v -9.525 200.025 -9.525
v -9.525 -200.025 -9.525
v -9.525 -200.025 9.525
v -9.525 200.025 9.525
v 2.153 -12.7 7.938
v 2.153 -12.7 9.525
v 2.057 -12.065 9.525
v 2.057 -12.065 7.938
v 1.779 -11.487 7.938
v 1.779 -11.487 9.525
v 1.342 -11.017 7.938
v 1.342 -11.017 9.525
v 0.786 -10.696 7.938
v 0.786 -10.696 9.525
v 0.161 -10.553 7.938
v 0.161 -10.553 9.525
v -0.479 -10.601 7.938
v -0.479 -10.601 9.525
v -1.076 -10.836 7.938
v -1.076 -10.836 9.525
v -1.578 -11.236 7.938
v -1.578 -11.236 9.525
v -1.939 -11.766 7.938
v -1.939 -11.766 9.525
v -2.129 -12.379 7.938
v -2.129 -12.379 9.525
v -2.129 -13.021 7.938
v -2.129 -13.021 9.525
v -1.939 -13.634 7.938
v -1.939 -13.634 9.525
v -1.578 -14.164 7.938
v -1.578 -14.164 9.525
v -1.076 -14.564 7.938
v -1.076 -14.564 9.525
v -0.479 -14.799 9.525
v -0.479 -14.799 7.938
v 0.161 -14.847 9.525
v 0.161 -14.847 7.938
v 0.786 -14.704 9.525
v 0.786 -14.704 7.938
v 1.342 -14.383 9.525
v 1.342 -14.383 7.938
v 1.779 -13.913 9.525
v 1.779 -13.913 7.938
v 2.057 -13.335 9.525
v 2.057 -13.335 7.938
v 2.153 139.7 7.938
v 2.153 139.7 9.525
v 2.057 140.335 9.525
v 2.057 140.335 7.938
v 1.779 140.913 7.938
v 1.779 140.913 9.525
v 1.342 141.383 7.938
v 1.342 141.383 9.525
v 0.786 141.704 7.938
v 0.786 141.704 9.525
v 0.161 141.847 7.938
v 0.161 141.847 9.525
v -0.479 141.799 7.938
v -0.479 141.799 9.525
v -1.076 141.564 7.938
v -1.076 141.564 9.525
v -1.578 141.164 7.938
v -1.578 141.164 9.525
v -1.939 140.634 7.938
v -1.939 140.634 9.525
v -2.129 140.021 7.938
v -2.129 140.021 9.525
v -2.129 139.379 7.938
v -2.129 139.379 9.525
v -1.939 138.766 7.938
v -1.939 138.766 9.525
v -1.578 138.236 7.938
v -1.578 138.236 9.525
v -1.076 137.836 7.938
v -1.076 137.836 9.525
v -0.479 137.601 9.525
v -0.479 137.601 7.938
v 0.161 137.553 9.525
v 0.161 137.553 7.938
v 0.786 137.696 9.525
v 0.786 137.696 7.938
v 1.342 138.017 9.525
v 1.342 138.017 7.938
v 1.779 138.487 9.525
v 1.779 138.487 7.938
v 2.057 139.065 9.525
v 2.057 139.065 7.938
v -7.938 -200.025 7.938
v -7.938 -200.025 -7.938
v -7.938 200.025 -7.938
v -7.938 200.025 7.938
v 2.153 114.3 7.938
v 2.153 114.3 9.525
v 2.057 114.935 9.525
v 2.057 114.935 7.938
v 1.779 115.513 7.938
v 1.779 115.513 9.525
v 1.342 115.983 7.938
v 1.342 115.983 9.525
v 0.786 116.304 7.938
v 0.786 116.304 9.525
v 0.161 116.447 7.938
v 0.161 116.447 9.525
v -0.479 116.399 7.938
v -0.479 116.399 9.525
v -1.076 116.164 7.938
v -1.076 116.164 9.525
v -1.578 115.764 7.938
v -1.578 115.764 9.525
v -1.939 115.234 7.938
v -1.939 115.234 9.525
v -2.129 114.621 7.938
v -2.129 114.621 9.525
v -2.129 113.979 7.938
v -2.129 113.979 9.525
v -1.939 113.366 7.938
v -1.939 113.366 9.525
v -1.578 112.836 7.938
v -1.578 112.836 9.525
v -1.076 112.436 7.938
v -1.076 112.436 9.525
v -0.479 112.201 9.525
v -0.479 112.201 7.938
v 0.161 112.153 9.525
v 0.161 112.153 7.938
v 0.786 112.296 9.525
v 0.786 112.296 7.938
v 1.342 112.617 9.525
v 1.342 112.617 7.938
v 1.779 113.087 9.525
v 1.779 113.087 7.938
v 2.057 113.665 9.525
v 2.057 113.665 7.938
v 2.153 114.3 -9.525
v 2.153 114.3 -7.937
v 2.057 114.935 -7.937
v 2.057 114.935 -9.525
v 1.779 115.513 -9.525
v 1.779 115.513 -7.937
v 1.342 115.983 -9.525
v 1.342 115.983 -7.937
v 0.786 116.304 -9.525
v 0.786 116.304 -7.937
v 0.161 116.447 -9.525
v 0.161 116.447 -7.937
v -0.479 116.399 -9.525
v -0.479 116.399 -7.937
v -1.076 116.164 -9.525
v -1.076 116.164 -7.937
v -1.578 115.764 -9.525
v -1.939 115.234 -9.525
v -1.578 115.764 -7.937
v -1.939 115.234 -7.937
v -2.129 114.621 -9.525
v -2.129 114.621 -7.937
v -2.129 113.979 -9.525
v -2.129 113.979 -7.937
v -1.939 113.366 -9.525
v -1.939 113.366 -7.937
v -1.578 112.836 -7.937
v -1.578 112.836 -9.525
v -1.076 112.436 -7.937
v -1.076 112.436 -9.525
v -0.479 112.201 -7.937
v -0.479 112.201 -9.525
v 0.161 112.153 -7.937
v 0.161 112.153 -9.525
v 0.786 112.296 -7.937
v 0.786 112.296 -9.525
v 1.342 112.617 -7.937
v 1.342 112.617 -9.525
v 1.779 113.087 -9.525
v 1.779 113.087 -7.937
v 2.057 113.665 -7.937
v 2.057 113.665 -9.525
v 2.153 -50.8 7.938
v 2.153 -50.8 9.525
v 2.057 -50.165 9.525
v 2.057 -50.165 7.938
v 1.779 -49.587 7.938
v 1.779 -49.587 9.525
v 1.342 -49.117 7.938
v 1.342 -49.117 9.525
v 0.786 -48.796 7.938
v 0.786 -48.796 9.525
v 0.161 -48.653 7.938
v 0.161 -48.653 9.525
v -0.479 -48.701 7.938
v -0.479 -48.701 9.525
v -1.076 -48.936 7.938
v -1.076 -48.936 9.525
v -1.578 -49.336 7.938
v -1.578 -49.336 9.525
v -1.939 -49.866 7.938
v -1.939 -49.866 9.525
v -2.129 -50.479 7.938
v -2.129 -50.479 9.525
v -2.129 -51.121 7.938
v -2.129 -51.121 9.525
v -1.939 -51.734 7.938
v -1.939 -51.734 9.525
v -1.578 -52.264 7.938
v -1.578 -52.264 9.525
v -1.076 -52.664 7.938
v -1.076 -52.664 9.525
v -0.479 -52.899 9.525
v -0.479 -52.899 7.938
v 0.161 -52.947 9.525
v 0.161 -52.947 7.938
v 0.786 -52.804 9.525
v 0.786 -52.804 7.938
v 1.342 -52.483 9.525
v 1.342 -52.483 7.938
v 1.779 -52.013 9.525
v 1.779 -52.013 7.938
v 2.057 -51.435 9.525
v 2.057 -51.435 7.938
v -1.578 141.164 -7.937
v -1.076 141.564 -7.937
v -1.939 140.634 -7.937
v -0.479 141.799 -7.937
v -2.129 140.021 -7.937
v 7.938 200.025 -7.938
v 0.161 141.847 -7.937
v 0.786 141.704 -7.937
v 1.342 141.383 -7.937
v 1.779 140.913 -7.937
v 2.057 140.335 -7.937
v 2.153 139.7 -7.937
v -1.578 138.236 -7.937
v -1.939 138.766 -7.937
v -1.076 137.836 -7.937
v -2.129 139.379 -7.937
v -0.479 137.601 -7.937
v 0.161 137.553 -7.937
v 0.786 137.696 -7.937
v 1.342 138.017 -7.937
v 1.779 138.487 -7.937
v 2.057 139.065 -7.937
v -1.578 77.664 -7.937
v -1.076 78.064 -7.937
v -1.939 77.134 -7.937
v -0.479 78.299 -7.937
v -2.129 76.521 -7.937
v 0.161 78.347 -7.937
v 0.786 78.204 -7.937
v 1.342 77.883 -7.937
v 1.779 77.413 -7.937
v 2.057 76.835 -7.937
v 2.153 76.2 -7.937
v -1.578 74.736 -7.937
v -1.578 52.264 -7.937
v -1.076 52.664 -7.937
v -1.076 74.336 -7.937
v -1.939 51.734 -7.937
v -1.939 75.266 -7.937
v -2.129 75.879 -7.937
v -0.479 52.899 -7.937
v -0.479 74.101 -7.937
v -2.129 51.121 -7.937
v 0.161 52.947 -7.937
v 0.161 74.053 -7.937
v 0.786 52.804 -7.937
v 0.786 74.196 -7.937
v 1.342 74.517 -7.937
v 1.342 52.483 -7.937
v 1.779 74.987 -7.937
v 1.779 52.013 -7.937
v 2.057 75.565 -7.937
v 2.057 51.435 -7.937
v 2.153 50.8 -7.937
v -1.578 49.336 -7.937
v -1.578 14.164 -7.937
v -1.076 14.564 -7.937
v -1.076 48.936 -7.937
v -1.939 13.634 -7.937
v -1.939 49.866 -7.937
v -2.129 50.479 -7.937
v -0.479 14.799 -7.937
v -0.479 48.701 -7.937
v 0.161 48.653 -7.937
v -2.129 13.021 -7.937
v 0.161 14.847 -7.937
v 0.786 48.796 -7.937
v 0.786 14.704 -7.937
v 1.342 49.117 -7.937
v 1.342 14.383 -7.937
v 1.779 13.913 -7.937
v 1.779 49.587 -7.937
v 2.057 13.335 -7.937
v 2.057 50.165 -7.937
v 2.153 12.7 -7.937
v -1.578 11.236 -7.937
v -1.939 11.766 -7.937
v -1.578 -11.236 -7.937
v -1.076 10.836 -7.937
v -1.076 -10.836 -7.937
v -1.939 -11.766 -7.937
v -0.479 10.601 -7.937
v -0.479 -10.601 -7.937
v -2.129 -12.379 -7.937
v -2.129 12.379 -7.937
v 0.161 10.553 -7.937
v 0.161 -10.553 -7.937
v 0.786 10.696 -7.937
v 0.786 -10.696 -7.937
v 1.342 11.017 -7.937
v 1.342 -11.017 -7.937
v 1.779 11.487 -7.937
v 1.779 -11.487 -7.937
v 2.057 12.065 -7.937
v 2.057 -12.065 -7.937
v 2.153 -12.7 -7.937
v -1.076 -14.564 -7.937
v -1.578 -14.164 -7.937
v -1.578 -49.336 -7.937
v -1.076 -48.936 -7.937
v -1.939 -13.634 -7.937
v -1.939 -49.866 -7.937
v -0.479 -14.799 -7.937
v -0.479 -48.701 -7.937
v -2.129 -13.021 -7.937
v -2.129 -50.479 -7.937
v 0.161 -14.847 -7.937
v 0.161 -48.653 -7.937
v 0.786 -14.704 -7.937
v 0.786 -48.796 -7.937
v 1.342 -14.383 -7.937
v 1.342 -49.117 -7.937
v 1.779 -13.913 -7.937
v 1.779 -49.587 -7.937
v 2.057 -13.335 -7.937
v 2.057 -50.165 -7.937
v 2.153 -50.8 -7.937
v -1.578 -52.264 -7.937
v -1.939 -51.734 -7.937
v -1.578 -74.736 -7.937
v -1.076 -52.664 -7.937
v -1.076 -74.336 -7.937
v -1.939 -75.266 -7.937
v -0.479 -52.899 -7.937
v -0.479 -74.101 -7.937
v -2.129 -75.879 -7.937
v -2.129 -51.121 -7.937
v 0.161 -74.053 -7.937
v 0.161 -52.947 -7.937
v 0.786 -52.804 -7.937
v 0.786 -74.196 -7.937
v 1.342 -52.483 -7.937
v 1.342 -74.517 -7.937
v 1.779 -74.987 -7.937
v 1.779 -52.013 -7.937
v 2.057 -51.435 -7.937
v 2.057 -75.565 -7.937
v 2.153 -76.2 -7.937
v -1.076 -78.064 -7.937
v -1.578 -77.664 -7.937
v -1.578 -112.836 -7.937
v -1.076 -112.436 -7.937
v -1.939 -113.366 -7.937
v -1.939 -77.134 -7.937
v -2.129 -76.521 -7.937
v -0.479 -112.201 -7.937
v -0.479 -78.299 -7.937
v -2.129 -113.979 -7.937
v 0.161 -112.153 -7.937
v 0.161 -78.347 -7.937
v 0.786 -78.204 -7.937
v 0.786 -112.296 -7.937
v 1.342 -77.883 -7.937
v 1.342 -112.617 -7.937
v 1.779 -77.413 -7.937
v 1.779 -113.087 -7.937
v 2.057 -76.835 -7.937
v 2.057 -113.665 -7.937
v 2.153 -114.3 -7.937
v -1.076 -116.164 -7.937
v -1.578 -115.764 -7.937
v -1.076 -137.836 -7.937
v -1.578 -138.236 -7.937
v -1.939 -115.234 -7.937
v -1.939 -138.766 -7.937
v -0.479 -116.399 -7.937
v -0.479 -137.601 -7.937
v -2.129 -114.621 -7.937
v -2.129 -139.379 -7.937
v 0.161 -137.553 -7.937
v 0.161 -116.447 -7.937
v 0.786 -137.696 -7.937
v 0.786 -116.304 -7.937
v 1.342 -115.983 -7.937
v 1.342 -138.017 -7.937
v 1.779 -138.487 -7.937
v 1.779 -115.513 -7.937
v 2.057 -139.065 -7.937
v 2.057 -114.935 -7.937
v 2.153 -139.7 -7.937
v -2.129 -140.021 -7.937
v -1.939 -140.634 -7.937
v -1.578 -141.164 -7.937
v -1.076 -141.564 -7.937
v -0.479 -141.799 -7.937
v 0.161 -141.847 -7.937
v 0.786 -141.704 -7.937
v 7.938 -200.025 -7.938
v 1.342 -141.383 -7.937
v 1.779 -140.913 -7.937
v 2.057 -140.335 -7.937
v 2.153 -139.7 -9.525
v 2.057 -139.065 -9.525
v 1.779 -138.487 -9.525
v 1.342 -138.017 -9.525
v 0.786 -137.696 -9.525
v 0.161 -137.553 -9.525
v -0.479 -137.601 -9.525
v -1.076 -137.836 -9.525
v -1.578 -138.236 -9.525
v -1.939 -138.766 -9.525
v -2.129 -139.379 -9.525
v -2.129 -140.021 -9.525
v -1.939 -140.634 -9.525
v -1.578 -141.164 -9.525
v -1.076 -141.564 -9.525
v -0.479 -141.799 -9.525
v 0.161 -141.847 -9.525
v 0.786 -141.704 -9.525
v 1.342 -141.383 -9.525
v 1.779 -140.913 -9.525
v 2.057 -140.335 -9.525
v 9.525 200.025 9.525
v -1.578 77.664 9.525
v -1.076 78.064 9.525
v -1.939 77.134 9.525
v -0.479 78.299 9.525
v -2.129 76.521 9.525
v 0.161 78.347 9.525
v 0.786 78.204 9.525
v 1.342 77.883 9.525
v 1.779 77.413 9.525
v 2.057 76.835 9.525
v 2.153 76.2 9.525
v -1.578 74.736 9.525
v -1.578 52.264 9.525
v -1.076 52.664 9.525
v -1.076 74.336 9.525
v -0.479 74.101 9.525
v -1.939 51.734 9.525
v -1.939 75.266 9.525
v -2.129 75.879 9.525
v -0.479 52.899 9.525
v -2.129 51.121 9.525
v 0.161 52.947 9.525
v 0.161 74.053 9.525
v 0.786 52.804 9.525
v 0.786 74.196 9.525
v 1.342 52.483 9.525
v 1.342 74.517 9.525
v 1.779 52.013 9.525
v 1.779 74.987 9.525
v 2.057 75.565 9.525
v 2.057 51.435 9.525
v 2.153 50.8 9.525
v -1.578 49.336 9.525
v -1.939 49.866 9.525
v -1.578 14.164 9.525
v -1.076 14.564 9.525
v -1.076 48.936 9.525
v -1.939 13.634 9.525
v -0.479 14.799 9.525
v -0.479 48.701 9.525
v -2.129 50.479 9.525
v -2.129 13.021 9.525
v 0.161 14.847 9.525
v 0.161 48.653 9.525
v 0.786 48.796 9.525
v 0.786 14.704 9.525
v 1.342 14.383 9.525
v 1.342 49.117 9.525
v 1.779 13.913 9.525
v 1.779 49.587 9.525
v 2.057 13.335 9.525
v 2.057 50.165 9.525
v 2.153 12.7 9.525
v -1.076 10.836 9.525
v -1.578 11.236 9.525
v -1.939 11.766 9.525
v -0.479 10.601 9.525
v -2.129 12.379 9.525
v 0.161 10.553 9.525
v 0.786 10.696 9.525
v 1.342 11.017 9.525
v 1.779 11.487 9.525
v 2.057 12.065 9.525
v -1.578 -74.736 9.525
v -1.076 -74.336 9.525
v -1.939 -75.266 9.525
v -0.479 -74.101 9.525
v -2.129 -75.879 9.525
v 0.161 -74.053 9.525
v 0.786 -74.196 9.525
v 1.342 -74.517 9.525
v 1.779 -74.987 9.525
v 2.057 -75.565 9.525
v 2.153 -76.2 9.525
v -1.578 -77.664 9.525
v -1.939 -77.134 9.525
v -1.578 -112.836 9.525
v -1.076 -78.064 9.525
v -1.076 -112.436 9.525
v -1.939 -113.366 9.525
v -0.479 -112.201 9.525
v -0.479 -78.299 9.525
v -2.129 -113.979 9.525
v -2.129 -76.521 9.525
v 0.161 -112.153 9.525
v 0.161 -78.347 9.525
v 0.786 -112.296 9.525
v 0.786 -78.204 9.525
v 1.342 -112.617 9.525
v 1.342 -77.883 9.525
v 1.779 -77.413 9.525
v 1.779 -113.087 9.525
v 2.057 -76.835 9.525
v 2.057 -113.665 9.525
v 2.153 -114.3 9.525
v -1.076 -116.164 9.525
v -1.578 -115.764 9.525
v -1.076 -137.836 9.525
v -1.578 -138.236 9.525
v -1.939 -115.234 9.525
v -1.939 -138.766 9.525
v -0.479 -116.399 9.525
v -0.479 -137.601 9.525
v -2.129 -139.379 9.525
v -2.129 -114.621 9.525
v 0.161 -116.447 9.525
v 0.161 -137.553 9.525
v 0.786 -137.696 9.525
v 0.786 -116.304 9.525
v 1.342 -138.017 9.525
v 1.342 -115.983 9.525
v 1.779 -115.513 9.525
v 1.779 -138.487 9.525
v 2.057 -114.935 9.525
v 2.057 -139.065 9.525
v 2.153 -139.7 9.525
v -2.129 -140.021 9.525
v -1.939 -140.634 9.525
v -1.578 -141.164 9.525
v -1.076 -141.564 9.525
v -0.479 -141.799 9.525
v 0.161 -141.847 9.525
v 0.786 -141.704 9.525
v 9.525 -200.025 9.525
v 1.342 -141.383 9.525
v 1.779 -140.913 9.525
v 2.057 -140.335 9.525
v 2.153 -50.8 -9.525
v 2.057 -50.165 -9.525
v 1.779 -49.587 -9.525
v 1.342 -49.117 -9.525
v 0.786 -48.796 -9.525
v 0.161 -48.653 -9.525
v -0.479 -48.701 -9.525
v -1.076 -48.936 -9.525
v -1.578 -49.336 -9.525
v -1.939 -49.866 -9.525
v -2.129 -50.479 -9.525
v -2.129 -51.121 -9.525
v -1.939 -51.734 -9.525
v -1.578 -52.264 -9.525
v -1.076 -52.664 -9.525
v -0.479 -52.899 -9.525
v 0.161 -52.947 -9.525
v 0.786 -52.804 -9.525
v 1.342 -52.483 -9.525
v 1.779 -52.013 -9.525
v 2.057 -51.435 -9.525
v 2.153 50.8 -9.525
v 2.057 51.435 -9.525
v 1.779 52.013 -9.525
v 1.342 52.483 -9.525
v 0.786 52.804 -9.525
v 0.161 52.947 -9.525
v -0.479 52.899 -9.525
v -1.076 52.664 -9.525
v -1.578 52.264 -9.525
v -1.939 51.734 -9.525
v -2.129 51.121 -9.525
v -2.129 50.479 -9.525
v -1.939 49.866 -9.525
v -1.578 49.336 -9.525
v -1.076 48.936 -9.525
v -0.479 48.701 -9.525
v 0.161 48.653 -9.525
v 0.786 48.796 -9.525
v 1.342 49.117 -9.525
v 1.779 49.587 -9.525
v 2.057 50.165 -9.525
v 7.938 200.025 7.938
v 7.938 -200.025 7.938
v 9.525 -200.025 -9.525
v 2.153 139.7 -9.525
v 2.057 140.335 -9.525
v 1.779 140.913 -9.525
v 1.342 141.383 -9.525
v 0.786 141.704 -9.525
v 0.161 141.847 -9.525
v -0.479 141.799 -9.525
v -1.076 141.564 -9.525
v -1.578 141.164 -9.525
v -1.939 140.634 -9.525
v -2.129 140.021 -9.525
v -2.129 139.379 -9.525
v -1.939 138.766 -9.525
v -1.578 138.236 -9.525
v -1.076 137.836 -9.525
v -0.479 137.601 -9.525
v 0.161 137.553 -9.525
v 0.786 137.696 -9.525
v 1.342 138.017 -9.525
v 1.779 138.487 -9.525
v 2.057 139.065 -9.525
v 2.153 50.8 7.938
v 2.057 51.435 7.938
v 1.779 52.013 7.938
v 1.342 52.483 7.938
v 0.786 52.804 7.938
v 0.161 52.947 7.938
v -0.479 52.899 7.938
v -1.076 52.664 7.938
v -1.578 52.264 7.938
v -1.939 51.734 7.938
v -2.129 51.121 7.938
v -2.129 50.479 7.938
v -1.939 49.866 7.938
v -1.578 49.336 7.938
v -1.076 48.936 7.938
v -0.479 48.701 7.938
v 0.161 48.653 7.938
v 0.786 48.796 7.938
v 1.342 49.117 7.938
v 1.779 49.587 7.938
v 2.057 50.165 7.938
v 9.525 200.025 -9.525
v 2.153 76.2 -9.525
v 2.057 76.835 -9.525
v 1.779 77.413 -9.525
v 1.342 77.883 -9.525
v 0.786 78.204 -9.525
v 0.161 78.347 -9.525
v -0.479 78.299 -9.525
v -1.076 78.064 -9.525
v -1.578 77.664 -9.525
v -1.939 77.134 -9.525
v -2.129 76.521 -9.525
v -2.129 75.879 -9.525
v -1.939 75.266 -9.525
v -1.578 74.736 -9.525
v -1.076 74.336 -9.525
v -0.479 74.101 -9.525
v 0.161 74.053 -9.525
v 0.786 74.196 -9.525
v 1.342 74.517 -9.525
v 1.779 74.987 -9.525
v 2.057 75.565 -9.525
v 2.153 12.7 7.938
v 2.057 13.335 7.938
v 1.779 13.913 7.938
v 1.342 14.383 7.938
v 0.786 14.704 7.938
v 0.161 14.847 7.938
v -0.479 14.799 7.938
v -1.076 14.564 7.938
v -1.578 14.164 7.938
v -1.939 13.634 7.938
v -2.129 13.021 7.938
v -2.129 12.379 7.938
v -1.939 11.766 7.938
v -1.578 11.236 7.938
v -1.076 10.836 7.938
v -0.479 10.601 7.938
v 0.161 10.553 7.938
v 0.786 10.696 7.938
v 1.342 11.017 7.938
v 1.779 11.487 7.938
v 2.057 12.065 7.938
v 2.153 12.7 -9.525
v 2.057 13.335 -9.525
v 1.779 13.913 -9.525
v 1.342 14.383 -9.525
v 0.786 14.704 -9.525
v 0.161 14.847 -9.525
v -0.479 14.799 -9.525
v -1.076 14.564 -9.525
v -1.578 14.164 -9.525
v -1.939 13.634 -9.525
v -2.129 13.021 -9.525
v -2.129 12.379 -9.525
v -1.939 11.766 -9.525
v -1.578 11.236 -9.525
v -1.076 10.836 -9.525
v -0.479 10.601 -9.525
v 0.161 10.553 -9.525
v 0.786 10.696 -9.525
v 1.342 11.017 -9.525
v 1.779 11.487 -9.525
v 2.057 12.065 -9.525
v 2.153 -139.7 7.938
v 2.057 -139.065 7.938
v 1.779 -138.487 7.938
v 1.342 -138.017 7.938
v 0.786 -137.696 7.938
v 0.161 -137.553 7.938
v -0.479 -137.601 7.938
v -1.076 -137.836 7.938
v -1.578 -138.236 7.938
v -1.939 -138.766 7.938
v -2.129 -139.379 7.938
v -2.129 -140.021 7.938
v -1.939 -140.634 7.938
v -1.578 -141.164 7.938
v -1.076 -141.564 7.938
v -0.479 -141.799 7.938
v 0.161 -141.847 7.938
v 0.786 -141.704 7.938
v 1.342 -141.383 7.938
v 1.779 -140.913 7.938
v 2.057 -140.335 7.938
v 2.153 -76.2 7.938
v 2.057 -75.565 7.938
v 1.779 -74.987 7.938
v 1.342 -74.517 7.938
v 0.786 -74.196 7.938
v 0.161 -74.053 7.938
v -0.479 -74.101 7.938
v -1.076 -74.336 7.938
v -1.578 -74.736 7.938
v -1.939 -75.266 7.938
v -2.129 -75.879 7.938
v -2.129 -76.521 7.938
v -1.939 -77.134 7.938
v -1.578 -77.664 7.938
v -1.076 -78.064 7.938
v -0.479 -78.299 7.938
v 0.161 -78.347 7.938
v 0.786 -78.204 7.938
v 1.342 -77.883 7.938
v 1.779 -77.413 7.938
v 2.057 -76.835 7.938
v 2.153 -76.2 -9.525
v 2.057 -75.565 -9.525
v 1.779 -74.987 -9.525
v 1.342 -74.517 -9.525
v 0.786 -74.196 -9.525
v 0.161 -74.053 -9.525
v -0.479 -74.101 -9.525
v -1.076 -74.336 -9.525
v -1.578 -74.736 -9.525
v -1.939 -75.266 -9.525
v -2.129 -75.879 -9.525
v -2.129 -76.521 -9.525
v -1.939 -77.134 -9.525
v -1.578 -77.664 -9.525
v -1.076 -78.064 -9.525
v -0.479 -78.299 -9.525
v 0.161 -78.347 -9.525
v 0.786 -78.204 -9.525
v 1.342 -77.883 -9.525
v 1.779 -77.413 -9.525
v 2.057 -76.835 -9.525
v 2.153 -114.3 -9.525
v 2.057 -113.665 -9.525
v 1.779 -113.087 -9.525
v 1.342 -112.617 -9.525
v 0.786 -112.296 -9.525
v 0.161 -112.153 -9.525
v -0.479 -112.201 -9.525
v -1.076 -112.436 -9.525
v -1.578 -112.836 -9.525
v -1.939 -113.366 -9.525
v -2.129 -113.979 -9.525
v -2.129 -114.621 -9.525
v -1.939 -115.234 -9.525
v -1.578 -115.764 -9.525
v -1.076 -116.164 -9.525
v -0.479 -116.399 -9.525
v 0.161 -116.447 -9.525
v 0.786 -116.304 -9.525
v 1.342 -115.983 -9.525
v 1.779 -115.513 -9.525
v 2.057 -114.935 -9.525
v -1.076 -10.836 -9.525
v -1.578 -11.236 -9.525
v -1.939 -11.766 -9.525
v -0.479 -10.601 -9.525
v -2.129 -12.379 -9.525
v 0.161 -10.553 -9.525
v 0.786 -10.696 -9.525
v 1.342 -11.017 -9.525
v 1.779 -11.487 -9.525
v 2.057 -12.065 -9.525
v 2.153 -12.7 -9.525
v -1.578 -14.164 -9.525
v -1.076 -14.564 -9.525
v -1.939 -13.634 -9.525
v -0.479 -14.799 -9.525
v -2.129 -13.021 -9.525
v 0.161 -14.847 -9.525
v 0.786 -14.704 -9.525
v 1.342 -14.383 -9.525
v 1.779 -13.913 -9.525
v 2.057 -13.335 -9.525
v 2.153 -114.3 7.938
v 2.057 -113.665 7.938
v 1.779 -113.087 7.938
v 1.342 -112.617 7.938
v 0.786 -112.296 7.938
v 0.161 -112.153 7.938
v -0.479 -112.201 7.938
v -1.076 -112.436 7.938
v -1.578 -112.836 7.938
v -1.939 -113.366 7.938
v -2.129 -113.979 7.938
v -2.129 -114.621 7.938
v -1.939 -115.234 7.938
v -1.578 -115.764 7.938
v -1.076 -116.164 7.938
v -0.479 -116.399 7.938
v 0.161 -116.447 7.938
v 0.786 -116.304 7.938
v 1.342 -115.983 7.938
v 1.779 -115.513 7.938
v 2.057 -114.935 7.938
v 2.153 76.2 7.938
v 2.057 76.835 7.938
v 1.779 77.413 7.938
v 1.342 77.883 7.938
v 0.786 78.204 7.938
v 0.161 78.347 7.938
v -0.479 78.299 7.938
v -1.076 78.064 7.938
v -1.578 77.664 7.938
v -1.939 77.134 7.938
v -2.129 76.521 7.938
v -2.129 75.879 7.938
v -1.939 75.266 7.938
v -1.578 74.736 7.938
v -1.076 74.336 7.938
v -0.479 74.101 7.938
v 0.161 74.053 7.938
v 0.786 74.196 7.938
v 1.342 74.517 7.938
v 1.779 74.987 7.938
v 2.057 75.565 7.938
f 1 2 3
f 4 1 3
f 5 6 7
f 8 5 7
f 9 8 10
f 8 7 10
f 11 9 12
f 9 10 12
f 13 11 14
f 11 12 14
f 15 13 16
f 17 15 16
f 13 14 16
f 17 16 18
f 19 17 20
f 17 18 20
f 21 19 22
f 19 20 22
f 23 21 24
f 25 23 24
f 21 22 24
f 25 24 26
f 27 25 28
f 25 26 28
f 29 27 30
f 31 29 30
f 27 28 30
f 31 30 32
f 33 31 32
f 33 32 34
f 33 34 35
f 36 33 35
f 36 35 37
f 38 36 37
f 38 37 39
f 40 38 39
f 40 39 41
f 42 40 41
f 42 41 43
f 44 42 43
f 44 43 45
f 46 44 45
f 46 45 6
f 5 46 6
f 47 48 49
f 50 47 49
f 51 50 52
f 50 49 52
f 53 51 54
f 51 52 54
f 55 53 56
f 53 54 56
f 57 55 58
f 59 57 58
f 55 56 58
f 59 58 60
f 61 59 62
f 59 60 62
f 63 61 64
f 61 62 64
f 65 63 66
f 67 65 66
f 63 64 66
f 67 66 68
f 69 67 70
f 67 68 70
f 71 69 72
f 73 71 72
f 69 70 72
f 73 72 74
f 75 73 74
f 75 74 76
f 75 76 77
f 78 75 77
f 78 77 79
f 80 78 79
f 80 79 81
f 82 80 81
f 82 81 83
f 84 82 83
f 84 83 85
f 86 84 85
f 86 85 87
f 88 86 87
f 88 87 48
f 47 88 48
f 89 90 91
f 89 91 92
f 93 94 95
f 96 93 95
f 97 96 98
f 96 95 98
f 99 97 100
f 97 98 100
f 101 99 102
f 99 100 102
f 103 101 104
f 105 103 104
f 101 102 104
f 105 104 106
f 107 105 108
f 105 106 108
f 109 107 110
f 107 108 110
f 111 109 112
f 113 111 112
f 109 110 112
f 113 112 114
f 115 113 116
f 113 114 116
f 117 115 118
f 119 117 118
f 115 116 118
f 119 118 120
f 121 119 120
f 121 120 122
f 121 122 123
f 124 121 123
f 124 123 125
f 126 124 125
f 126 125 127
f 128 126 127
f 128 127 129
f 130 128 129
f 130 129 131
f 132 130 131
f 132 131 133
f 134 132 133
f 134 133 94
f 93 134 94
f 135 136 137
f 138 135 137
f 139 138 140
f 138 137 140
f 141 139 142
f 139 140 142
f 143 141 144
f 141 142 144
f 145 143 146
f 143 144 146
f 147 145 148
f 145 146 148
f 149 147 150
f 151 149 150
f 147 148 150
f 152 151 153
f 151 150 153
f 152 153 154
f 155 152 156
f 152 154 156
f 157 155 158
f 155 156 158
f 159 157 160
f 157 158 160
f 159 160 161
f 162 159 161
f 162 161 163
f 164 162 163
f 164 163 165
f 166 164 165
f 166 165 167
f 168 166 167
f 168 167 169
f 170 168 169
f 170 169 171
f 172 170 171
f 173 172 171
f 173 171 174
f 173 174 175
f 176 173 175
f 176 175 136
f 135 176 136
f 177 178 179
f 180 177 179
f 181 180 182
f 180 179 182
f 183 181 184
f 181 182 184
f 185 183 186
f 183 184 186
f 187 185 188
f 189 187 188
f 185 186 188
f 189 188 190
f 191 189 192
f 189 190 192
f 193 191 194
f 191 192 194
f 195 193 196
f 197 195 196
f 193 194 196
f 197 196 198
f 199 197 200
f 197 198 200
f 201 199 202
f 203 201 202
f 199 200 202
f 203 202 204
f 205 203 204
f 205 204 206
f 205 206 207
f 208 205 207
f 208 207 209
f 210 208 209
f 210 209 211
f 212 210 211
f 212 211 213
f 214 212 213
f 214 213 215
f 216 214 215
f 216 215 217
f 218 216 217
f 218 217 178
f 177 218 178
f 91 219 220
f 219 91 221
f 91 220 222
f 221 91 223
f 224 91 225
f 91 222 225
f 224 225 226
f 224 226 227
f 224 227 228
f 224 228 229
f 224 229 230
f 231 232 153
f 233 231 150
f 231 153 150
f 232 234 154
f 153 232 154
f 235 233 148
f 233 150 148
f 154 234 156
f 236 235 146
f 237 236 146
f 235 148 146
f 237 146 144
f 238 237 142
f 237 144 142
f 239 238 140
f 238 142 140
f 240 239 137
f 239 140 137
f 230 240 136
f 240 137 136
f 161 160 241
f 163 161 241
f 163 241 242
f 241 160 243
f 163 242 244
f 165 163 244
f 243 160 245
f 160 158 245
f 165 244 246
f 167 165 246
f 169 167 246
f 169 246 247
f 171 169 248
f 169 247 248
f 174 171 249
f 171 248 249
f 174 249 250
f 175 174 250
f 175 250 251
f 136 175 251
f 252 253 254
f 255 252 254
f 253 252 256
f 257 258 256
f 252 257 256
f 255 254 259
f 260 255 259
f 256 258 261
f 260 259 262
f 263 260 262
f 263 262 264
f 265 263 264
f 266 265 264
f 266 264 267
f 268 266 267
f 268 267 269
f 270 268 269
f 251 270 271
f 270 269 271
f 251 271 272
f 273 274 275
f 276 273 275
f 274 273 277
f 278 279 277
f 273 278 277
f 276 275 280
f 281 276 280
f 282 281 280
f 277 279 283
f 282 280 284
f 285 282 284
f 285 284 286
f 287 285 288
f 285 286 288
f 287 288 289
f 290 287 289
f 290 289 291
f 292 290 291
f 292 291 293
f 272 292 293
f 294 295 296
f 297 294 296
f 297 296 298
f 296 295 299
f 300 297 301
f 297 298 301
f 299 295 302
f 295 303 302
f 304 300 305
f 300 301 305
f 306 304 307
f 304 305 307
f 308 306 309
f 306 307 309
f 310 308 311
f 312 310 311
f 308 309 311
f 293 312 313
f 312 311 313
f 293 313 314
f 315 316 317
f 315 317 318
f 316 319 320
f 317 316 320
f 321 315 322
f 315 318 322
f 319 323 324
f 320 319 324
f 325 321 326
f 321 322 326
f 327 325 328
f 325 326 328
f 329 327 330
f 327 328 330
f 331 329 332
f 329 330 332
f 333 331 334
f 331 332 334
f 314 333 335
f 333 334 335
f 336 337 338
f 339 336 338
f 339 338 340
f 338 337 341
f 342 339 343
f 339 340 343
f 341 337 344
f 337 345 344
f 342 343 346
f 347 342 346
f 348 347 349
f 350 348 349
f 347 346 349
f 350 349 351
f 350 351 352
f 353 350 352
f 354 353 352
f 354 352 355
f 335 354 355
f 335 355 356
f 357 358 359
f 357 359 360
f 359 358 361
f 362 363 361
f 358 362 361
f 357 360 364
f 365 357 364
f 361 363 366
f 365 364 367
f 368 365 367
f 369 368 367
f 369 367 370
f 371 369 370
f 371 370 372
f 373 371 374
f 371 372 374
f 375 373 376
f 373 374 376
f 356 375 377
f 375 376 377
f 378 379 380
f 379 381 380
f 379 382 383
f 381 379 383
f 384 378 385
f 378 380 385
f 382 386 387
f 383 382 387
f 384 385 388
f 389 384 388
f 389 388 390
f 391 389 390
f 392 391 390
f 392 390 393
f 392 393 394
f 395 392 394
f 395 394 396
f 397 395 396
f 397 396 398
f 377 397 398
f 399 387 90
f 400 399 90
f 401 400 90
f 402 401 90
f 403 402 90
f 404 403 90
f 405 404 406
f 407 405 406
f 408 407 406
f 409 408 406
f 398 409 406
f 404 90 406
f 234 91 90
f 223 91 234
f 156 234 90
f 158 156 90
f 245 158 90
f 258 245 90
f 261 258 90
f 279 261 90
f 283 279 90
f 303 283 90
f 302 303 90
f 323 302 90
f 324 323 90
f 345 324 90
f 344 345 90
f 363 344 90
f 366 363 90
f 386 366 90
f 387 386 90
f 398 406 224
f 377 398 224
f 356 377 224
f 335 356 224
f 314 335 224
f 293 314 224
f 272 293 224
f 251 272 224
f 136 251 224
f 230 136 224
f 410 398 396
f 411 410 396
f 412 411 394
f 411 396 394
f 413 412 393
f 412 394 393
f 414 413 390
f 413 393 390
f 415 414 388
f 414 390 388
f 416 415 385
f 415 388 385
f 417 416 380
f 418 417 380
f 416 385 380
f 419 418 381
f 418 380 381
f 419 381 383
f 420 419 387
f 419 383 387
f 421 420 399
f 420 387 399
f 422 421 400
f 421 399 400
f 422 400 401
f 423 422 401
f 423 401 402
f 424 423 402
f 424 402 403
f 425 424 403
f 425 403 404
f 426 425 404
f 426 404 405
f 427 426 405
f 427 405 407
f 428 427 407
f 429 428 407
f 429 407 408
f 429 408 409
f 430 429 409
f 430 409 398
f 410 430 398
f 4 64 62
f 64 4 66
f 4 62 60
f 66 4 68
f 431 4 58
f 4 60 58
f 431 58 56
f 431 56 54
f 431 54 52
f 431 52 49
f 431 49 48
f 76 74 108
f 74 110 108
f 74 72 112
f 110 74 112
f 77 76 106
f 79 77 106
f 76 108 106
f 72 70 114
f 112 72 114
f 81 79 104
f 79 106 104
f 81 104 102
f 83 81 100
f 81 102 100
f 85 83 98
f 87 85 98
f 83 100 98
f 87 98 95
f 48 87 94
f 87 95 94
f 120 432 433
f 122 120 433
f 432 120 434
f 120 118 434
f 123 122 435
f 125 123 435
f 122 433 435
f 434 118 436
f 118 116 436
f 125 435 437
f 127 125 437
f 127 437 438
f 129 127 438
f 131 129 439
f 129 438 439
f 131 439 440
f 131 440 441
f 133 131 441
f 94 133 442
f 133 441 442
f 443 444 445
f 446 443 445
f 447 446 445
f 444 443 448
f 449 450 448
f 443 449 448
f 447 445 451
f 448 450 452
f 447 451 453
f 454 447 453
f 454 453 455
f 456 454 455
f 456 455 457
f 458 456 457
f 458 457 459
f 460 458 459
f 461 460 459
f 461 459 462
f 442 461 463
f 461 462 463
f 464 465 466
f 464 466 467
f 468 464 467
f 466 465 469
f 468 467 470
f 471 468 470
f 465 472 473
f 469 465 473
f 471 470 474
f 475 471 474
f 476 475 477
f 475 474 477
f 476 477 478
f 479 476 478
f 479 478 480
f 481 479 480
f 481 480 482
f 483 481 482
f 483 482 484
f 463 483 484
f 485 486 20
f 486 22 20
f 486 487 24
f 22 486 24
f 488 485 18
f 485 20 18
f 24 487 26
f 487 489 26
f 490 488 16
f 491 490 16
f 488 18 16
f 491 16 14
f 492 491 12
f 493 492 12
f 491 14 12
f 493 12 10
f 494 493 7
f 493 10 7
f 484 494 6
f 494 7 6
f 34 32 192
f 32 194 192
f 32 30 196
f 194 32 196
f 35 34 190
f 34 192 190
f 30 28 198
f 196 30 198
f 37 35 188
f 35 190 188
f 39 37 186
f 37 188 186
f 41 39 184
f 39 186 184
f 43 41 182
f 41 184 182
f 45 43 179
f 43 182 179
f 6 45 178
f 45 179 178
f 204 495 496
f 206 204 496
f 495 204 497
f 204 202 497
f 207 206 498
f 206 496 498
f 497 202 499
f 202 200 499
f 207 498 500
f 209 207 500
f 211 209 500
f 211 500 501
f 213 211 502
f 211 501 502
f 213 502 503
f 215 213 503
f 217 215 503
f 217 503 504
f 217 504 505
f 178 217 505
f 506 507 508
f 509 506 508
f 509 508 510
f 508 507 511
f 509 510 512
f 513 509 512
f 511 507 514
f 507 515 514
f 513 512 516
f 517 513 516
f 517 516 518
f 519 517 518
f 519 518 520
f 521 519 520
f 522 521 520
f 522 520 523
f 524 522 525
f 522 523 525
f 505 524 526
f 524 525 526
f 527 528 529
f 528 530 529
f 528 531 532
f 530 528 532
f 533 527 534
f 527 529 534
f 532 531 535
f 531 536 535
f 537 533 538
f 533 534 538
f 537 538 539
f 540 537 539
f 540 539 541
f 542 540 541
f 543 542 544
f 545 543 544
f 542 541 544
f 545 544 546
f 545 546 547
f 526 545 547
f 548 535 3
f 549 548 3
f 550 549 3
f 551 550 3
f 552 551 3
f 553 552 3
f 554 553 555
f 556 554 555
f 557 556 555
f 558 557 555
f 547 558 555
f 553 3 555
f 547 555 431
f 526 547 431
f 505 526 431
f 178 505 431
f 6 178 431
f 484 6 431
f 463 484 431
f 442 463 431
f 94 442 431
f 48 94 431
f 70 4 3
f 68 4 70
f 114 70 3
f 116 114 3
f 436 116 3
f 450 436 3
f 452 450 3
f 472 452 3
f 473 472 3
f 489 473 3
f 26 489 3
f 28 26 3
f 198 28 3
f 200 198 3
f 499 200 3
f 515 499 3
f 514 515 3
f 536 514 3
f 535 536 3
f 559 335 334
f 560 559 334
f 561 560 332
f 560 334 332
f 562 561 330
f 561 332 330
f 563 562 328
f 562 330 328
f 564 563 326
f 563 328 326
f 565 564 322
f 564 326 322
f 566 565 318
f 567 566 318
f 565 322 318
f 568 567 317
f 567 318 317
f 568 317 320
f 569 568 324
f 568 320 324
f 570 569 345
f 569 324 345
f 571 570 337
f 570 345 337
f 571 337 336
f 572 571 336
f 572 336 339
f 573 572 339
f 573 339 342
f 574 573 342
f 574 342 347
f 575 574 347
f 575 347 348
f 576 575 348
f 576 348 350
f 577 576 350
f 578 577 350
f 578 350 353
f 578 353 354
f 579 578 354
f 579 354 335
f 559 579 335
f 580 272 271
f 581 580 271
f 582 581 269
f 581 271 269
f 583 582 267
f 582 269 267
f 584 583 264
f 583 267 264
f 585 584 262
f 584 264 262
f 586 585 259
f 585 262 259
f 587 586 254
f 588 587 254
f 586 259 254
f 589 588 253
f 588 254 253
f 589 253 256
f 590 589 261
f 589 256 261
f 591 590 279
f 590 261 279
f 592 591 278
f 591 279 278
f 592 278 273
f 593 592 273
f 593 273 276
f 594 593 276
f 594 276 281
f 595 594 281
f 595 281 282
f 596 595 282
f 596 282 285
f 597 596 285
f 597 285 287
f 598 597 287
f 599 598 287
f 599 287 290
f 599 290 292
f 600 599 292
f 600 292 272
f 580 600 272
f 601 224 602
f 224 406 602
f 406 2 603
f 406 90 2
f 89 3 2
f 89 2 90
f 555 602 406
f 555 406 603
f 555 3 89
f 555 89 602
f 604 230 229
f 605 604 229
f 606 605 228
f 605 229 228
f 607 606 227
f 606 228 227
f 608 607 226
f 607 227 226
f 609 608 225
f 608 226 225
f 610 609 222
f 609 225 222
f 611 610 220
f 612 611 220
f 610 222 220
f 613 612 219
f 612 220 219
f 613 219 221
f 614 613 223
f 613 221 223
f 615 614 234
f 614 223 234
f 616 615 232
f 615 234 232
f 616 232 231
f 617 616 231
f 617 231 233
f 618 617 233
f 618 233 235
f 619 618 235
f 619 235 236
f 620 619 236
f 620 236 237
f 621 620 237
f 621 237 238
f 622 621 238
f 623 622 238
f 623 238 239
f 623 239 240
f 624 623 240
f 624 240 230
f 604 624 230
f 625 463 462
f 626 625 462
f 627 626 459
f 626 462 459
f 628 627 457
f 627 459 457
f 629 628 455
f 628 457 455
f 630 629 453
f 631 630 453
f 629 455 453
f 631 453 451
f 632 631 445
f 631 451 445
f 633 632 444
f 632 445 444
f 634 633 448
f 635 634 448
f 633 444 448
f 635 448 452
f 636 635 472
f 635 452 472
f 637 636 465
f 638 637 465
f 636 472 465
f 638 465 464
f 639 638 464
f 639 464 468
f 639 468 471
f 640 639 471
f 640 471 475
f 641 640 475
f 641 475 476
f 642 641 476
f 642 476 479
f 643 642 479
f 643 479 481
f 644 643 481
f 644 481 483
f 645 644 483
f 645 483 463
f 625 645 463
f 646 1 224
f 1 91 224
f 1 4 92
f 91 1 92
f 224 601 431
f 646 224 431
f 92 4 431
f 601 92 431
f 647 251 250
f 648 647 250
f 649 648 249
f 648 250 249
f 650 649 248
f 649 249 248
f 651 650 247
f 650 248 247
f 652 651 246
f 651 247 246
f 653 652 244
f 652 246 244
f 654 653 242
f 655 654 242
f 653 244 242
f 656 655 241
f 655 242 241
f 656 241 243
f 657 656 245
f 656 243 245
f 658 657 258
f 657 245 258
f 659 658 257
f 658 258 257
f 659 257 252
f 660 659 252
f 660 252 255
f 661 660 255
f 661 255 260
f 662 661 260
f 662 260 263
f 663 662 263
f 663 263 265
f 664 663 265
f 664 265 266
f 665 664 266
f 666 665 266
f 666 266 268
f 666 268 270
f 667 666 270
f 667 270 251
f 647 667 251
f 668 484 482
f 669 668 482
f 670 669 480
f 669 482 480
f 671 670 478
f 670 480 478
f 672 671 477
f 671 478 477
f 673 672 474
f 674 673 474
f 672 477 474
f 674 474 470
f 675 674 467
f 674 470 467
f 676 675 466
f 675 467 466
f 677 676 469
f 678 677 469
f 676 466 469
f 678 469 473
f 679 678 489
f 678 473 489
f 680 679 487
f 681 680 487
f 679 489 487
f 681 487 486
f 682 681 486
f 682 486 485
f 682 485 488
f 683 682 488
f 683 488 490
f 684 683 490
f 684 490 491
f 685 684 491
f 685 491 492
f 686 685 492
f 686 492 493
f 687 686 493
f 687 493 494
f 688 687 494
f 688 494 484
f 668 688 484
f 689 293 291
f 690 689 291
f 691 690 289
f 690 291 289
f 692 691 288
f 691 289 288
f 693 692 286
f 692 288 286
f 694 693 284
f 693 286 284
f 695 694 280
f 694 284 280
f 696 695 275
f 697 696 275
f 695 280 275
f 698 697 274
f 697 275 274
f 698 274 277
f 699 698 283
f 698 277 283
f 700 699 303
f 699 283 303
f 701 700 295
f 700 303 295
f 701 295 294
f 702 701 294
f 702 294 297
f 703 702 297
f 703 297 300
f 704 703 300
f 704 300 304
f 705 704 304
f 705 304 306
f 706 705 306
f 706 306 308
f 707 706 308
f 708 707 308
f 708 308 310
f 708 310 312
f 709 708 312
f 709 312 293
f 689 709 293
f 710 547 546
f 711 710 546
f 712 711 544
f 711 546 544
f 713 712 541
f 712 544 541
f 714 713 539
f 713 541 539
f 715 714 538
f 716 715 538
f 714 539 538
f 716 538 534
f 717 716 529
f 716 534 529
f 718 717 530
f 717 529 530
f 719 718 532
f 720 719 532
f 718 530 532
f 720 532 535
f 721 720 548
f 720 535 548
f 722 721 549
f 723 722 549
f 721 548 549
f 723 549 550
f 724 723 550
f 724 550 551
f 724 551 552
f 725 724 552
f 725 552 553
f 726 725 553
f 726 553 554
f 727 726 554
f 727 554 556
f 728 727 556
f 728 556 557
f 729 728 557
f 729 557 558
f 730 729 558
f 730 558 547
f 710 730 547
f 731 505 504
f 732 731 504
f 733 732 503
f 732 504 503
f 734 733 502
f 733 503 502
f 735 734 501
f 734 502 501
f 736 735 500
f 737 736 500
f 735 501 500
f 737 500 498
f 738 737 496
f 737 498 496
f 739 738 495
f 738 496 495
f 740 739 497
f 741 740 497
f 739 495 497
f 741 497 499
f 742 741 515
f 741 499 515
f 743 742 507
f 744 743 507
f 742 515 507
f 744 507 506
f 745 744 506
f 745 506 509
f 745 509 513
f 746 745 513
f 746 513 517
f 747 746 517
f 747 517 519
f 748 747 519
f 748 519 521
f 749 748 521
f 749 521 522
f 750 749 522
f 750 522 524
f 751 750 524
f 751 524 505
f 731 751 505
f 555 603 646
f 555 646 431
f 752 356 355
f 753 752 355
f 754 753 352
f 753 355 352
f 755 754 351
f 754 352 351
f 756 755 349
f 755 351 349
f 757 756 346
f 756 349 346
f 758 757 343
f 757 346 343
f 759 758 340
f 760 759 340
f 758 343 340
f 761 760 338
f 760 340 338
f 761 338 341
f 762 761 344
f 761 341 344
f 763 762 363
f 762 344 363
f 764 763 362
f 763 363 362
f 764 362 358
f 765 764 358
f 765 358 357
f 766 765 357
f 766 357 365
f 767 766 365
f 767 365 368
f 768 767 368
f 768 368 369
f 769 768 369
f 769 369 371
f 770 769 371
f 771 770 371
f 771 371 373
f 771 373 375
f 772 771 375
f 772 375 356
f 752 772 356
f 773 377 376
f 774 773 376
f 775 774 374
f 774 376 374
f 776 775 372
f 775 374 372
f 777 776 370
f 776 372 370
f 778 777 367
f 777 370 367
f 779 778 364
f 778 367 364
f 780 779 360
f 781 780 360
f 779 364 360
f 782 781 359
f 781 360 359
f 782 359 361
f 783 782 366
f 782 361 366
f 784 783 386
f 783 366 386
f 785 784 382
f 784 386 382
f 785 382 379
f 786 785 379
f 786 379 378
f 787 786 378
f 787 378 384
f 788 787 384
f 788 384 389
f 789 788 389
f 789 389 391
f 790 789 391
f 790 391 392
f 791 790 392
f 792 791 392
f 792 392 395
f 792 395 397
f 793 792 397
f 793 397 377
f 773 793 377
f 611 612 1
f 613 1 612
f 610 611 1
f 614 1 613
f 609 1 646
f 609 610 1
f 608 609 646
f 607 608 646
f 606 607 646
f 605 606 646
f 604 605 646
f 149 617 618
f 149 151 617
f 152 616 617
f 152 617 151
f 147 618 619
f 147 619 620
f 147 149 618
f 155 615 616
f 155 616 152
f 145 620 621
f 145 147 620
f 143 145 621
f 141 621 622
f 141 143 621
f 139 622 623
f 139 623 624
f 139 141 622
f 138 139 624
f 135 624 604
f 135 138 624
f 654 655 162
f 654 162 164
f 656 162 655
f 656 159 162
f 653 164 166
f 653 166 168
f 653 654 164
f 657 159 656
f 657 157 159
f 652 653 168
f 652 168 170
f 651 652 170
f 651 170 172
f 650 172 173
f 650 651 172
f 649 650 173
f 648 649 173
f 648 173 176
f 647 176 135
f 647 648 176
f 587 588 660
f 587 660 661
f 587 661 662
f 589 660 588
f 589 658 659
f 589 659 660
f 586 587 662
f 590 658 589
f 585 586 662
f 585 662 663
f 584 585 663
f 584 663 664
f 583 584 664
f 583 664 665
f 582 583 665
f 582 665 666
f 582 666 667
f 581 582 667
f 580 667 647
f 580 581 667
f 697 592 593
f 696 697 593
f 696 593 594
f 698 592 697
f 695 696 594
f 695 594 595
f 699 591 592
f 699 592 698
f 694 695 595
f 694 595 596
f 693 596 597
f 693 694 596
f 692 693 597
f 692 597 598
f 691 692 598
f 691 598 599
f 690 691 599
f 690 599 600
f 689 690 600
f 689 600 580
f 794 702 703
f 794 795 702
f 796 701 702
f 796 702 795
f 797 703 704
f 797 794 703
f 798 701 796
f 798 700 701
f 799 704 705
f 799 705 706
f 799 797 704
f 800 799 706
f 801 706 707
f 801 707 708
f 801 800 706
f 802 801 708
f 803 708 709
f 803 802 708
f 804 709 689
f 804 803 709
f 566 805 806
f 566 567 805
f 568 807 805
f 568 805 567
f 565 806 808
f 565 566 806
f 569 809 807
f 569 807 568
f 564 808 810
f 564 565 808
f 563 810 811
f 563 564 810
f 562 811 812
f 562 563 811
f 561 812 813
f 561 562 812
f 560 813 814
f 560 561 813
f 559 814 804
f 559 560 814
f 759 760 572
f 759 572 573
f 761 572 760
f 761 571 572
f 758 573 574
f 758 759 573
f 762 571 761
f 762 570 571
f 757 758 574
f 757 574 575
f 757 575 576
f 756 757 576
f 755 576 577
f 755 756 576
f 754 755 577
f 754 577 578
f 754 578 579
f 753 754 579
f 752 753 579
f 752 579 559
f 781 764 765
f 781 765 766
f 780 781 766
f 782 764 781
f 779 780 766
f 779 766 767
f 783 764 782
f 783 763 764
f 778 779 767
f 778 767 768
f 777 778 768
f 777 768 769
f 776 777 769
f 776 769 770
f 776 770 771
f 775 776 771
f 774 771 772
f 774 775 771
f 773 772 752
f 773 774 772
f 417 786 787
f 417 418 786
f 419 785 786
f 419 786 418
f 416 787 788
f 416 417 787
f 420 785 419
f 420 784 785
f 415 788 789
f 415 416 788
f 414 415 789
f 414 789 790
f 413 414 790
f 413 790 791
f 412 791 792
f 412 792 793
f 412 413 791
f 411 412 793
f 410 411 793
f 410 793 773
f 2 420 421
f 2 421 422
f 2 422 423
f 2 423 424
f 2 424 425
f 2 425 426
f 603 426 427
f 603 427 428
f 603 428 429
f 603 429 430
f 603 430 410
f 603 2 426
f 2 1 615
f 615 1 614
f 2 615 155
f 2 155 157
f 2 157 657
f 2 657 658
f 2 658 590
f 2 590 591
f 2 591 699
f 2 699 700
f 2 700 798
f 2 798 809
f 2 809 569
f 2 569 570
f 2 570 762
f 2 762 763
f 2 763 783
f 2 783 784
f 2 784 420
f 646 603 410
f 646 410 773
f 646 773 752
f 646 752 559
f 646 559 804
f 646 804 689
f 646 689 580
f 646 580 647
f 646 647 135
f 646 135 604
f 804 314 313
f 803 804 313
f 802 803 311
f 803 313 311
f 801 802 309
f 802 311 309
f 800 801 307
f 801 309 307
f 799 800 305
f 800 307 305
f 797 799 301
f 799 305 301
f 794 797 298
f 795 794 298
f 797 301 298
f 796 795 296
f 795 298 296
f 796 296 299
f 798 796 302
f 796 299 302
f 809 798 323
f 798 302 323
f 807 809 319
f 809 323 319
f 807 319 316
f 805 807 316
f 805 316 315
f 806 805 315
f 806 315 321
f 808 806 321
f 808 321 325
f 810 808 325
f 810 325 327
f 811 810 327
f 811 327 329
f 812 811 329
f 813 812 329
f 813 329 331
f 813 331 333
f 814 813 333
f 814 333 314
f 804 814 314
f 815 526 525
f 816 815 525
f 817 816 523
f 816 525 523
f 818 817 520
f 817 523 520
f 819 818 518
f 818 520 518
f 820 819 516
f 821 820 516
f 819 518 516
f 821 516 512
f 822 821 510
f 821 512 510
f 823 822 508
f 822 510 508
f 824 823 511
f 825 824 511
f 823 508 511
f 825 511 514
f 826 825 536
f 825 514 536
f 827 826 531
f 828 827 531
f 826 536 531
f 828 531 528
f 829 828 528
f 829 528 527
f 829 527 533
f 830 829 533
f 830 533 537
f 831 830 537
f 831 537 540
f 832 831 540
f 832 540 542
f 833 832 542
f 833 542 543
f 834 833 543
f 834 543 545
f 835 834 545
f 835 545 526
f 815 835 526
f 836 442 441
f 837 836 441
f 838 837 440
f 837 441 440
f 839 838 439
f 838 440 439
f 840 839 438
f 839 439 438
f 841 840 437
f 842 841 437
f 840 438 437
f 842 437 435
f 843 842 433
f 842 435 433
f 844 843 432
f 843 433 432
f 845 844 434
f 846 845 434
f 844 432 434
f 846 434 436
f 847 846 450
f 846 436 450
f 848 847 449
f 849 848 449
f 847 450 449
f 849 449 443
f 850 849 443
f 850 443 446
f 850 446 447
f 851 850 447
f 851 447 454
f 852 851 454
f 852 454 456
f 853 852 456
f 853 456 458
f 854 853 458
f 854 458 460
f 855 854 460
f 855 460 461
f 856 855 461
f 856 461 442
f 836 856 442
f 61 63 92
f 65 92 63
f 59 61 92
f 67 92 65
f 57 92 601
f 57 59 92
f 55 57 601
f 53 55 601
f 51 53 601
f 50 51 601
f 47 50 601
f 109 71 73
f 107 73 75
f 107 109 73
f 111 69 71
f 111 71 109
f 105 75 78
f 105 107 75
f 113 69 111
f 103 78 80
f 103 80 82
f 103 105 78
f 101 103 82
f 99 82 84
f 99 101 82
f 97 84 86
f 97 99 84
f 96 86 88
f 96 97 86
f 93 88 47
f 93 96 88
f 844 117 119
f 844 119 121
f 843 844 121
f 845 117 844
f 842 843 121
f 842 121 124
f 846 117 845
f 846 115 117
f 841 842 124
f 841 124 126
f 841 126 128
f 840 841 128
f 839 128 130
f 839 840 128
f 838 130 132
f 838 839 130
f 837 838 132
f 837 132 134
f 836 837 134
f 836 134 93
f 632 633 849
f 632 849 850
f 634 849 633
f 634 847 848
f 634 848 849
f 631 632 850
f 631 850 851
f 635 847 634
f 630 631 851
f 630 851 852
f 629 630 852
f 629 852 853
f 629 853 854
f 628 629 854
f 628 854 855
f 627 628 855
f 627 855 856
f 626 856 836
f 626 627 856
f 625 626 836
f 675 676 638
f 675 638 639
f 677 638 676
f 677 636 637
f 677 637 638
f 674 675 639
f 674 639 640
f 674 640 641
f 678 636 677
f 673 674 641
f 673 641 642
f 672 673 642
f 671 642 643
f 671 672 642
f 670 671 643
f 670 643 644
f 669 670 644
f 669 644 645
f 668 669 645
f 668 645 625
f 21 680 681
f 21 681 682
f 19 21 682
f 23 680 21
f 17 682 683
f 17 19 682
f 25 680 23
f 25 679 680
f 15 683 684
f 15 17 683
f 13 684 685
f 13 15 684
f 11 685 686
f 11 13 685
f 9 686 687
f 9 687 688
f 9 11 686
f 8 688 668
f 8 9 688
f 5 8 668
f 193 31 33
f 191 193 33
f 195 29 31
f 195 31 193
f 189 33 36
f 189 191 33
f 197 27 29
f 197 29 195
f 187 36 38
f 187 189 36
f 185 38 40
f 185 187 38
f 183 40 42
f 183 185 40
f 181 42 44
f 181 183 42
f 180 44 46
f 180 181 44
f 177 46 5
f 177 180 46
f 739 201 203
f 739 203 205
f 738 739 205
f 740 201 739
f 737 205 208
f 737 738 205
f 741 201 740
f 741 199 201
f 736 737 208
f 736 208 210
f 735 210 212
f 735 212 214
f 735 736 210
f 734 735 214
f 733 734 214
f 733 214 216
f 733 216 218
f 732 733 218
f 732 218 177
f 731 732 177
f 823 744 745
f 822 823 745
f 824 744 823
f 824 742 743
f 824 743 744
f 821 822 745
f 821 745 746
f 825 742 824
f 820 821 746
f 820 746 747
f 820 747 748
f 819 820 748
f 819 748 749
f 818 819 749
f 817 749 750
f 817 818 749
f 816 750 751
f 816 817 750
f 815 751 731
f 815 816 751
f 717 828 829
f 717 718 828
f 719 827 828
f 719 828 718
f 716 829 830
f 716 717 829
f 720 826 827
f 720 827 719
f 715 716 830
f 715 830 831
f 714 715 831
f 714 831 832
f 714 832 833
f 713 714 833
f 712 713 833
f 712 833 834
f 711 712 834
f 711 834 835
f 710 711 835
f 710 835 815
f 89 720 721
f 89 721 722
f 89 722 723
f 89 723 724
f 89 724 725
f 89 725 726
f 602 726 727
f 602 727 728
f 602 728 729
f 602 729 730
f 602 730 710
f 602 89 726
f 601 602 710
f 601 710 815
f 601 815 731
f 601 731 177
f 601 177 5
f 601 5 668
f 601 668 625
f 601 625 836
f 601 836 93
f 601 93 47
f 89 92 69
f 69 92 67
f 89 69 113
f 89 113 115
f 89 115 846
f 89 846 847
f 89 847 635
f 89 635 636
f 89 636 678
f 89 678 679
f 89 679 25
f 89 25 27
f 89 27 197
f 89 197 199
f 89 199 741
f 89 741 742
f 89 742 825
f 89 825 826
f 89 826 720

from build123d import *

# Parameters (mm, degrees)
F0_W       = 19.05
F0_H       = 19.05
F0_W_2     = 15.875
F0_H_2     = 15.875
F1_DEPTH   = 200.025
F2_R       = 2.15265
F1_FACE1_W = 19.05
F1_FACE1_H = 400.05
F3_DEPTH   = 25.4


with BuildPart() as f1:
    # F0 (on Front) → F1 (new body, symmetric)
    with BuildSketch(Plane.XZ):
        Rectangle(F0_W, F0_H)
        Rectangle(F0_W_2, F0_H_2, mode=Mode.SUBTRACT)
    extrude(amount=F1_DEPTH, both=True)

    # F2 (on face) + F1_face1 (on face) → F3 (cut)
    with BuildSketch(Plane.XY.offset(9.525)):
        with Locations((0, 12.7)):
            Circle(F2_R)
        with Locations((0, -12.7)):
            Circle(F2_R)
        with Locations((0, 76.2)):
            Circle(F2_R)
        with Locations((0, 50.8)):
            Circle(F2_R)
        with Locations((0, 139.7)):
            Circle(F2_R)
        with Locations((0, 114.3)):
            Circle(F2_R)
        with Locations((0, -50.8)):
            Circle(F2_R)
        with Locations((0, -76.2)):
            Circle(F2_R)
        with Locations((0, -114.3)):
            Circle(F2_R)
        with Locations((0, -139.7)):
            Circle(F2_R)
    with BuildSketch(Plane(origin=(0, 0, -9.525), x_dir=(1, 0, 0), z_dir=(0, 0, -1))):
        Rectangle(F1_FACE1_W, F1_FACE1_H)
    extrude(amount=-F3_DEPTH, dir=(0, 0, 1), mode=Mode.SUBTRACT)


solid = f1.part
